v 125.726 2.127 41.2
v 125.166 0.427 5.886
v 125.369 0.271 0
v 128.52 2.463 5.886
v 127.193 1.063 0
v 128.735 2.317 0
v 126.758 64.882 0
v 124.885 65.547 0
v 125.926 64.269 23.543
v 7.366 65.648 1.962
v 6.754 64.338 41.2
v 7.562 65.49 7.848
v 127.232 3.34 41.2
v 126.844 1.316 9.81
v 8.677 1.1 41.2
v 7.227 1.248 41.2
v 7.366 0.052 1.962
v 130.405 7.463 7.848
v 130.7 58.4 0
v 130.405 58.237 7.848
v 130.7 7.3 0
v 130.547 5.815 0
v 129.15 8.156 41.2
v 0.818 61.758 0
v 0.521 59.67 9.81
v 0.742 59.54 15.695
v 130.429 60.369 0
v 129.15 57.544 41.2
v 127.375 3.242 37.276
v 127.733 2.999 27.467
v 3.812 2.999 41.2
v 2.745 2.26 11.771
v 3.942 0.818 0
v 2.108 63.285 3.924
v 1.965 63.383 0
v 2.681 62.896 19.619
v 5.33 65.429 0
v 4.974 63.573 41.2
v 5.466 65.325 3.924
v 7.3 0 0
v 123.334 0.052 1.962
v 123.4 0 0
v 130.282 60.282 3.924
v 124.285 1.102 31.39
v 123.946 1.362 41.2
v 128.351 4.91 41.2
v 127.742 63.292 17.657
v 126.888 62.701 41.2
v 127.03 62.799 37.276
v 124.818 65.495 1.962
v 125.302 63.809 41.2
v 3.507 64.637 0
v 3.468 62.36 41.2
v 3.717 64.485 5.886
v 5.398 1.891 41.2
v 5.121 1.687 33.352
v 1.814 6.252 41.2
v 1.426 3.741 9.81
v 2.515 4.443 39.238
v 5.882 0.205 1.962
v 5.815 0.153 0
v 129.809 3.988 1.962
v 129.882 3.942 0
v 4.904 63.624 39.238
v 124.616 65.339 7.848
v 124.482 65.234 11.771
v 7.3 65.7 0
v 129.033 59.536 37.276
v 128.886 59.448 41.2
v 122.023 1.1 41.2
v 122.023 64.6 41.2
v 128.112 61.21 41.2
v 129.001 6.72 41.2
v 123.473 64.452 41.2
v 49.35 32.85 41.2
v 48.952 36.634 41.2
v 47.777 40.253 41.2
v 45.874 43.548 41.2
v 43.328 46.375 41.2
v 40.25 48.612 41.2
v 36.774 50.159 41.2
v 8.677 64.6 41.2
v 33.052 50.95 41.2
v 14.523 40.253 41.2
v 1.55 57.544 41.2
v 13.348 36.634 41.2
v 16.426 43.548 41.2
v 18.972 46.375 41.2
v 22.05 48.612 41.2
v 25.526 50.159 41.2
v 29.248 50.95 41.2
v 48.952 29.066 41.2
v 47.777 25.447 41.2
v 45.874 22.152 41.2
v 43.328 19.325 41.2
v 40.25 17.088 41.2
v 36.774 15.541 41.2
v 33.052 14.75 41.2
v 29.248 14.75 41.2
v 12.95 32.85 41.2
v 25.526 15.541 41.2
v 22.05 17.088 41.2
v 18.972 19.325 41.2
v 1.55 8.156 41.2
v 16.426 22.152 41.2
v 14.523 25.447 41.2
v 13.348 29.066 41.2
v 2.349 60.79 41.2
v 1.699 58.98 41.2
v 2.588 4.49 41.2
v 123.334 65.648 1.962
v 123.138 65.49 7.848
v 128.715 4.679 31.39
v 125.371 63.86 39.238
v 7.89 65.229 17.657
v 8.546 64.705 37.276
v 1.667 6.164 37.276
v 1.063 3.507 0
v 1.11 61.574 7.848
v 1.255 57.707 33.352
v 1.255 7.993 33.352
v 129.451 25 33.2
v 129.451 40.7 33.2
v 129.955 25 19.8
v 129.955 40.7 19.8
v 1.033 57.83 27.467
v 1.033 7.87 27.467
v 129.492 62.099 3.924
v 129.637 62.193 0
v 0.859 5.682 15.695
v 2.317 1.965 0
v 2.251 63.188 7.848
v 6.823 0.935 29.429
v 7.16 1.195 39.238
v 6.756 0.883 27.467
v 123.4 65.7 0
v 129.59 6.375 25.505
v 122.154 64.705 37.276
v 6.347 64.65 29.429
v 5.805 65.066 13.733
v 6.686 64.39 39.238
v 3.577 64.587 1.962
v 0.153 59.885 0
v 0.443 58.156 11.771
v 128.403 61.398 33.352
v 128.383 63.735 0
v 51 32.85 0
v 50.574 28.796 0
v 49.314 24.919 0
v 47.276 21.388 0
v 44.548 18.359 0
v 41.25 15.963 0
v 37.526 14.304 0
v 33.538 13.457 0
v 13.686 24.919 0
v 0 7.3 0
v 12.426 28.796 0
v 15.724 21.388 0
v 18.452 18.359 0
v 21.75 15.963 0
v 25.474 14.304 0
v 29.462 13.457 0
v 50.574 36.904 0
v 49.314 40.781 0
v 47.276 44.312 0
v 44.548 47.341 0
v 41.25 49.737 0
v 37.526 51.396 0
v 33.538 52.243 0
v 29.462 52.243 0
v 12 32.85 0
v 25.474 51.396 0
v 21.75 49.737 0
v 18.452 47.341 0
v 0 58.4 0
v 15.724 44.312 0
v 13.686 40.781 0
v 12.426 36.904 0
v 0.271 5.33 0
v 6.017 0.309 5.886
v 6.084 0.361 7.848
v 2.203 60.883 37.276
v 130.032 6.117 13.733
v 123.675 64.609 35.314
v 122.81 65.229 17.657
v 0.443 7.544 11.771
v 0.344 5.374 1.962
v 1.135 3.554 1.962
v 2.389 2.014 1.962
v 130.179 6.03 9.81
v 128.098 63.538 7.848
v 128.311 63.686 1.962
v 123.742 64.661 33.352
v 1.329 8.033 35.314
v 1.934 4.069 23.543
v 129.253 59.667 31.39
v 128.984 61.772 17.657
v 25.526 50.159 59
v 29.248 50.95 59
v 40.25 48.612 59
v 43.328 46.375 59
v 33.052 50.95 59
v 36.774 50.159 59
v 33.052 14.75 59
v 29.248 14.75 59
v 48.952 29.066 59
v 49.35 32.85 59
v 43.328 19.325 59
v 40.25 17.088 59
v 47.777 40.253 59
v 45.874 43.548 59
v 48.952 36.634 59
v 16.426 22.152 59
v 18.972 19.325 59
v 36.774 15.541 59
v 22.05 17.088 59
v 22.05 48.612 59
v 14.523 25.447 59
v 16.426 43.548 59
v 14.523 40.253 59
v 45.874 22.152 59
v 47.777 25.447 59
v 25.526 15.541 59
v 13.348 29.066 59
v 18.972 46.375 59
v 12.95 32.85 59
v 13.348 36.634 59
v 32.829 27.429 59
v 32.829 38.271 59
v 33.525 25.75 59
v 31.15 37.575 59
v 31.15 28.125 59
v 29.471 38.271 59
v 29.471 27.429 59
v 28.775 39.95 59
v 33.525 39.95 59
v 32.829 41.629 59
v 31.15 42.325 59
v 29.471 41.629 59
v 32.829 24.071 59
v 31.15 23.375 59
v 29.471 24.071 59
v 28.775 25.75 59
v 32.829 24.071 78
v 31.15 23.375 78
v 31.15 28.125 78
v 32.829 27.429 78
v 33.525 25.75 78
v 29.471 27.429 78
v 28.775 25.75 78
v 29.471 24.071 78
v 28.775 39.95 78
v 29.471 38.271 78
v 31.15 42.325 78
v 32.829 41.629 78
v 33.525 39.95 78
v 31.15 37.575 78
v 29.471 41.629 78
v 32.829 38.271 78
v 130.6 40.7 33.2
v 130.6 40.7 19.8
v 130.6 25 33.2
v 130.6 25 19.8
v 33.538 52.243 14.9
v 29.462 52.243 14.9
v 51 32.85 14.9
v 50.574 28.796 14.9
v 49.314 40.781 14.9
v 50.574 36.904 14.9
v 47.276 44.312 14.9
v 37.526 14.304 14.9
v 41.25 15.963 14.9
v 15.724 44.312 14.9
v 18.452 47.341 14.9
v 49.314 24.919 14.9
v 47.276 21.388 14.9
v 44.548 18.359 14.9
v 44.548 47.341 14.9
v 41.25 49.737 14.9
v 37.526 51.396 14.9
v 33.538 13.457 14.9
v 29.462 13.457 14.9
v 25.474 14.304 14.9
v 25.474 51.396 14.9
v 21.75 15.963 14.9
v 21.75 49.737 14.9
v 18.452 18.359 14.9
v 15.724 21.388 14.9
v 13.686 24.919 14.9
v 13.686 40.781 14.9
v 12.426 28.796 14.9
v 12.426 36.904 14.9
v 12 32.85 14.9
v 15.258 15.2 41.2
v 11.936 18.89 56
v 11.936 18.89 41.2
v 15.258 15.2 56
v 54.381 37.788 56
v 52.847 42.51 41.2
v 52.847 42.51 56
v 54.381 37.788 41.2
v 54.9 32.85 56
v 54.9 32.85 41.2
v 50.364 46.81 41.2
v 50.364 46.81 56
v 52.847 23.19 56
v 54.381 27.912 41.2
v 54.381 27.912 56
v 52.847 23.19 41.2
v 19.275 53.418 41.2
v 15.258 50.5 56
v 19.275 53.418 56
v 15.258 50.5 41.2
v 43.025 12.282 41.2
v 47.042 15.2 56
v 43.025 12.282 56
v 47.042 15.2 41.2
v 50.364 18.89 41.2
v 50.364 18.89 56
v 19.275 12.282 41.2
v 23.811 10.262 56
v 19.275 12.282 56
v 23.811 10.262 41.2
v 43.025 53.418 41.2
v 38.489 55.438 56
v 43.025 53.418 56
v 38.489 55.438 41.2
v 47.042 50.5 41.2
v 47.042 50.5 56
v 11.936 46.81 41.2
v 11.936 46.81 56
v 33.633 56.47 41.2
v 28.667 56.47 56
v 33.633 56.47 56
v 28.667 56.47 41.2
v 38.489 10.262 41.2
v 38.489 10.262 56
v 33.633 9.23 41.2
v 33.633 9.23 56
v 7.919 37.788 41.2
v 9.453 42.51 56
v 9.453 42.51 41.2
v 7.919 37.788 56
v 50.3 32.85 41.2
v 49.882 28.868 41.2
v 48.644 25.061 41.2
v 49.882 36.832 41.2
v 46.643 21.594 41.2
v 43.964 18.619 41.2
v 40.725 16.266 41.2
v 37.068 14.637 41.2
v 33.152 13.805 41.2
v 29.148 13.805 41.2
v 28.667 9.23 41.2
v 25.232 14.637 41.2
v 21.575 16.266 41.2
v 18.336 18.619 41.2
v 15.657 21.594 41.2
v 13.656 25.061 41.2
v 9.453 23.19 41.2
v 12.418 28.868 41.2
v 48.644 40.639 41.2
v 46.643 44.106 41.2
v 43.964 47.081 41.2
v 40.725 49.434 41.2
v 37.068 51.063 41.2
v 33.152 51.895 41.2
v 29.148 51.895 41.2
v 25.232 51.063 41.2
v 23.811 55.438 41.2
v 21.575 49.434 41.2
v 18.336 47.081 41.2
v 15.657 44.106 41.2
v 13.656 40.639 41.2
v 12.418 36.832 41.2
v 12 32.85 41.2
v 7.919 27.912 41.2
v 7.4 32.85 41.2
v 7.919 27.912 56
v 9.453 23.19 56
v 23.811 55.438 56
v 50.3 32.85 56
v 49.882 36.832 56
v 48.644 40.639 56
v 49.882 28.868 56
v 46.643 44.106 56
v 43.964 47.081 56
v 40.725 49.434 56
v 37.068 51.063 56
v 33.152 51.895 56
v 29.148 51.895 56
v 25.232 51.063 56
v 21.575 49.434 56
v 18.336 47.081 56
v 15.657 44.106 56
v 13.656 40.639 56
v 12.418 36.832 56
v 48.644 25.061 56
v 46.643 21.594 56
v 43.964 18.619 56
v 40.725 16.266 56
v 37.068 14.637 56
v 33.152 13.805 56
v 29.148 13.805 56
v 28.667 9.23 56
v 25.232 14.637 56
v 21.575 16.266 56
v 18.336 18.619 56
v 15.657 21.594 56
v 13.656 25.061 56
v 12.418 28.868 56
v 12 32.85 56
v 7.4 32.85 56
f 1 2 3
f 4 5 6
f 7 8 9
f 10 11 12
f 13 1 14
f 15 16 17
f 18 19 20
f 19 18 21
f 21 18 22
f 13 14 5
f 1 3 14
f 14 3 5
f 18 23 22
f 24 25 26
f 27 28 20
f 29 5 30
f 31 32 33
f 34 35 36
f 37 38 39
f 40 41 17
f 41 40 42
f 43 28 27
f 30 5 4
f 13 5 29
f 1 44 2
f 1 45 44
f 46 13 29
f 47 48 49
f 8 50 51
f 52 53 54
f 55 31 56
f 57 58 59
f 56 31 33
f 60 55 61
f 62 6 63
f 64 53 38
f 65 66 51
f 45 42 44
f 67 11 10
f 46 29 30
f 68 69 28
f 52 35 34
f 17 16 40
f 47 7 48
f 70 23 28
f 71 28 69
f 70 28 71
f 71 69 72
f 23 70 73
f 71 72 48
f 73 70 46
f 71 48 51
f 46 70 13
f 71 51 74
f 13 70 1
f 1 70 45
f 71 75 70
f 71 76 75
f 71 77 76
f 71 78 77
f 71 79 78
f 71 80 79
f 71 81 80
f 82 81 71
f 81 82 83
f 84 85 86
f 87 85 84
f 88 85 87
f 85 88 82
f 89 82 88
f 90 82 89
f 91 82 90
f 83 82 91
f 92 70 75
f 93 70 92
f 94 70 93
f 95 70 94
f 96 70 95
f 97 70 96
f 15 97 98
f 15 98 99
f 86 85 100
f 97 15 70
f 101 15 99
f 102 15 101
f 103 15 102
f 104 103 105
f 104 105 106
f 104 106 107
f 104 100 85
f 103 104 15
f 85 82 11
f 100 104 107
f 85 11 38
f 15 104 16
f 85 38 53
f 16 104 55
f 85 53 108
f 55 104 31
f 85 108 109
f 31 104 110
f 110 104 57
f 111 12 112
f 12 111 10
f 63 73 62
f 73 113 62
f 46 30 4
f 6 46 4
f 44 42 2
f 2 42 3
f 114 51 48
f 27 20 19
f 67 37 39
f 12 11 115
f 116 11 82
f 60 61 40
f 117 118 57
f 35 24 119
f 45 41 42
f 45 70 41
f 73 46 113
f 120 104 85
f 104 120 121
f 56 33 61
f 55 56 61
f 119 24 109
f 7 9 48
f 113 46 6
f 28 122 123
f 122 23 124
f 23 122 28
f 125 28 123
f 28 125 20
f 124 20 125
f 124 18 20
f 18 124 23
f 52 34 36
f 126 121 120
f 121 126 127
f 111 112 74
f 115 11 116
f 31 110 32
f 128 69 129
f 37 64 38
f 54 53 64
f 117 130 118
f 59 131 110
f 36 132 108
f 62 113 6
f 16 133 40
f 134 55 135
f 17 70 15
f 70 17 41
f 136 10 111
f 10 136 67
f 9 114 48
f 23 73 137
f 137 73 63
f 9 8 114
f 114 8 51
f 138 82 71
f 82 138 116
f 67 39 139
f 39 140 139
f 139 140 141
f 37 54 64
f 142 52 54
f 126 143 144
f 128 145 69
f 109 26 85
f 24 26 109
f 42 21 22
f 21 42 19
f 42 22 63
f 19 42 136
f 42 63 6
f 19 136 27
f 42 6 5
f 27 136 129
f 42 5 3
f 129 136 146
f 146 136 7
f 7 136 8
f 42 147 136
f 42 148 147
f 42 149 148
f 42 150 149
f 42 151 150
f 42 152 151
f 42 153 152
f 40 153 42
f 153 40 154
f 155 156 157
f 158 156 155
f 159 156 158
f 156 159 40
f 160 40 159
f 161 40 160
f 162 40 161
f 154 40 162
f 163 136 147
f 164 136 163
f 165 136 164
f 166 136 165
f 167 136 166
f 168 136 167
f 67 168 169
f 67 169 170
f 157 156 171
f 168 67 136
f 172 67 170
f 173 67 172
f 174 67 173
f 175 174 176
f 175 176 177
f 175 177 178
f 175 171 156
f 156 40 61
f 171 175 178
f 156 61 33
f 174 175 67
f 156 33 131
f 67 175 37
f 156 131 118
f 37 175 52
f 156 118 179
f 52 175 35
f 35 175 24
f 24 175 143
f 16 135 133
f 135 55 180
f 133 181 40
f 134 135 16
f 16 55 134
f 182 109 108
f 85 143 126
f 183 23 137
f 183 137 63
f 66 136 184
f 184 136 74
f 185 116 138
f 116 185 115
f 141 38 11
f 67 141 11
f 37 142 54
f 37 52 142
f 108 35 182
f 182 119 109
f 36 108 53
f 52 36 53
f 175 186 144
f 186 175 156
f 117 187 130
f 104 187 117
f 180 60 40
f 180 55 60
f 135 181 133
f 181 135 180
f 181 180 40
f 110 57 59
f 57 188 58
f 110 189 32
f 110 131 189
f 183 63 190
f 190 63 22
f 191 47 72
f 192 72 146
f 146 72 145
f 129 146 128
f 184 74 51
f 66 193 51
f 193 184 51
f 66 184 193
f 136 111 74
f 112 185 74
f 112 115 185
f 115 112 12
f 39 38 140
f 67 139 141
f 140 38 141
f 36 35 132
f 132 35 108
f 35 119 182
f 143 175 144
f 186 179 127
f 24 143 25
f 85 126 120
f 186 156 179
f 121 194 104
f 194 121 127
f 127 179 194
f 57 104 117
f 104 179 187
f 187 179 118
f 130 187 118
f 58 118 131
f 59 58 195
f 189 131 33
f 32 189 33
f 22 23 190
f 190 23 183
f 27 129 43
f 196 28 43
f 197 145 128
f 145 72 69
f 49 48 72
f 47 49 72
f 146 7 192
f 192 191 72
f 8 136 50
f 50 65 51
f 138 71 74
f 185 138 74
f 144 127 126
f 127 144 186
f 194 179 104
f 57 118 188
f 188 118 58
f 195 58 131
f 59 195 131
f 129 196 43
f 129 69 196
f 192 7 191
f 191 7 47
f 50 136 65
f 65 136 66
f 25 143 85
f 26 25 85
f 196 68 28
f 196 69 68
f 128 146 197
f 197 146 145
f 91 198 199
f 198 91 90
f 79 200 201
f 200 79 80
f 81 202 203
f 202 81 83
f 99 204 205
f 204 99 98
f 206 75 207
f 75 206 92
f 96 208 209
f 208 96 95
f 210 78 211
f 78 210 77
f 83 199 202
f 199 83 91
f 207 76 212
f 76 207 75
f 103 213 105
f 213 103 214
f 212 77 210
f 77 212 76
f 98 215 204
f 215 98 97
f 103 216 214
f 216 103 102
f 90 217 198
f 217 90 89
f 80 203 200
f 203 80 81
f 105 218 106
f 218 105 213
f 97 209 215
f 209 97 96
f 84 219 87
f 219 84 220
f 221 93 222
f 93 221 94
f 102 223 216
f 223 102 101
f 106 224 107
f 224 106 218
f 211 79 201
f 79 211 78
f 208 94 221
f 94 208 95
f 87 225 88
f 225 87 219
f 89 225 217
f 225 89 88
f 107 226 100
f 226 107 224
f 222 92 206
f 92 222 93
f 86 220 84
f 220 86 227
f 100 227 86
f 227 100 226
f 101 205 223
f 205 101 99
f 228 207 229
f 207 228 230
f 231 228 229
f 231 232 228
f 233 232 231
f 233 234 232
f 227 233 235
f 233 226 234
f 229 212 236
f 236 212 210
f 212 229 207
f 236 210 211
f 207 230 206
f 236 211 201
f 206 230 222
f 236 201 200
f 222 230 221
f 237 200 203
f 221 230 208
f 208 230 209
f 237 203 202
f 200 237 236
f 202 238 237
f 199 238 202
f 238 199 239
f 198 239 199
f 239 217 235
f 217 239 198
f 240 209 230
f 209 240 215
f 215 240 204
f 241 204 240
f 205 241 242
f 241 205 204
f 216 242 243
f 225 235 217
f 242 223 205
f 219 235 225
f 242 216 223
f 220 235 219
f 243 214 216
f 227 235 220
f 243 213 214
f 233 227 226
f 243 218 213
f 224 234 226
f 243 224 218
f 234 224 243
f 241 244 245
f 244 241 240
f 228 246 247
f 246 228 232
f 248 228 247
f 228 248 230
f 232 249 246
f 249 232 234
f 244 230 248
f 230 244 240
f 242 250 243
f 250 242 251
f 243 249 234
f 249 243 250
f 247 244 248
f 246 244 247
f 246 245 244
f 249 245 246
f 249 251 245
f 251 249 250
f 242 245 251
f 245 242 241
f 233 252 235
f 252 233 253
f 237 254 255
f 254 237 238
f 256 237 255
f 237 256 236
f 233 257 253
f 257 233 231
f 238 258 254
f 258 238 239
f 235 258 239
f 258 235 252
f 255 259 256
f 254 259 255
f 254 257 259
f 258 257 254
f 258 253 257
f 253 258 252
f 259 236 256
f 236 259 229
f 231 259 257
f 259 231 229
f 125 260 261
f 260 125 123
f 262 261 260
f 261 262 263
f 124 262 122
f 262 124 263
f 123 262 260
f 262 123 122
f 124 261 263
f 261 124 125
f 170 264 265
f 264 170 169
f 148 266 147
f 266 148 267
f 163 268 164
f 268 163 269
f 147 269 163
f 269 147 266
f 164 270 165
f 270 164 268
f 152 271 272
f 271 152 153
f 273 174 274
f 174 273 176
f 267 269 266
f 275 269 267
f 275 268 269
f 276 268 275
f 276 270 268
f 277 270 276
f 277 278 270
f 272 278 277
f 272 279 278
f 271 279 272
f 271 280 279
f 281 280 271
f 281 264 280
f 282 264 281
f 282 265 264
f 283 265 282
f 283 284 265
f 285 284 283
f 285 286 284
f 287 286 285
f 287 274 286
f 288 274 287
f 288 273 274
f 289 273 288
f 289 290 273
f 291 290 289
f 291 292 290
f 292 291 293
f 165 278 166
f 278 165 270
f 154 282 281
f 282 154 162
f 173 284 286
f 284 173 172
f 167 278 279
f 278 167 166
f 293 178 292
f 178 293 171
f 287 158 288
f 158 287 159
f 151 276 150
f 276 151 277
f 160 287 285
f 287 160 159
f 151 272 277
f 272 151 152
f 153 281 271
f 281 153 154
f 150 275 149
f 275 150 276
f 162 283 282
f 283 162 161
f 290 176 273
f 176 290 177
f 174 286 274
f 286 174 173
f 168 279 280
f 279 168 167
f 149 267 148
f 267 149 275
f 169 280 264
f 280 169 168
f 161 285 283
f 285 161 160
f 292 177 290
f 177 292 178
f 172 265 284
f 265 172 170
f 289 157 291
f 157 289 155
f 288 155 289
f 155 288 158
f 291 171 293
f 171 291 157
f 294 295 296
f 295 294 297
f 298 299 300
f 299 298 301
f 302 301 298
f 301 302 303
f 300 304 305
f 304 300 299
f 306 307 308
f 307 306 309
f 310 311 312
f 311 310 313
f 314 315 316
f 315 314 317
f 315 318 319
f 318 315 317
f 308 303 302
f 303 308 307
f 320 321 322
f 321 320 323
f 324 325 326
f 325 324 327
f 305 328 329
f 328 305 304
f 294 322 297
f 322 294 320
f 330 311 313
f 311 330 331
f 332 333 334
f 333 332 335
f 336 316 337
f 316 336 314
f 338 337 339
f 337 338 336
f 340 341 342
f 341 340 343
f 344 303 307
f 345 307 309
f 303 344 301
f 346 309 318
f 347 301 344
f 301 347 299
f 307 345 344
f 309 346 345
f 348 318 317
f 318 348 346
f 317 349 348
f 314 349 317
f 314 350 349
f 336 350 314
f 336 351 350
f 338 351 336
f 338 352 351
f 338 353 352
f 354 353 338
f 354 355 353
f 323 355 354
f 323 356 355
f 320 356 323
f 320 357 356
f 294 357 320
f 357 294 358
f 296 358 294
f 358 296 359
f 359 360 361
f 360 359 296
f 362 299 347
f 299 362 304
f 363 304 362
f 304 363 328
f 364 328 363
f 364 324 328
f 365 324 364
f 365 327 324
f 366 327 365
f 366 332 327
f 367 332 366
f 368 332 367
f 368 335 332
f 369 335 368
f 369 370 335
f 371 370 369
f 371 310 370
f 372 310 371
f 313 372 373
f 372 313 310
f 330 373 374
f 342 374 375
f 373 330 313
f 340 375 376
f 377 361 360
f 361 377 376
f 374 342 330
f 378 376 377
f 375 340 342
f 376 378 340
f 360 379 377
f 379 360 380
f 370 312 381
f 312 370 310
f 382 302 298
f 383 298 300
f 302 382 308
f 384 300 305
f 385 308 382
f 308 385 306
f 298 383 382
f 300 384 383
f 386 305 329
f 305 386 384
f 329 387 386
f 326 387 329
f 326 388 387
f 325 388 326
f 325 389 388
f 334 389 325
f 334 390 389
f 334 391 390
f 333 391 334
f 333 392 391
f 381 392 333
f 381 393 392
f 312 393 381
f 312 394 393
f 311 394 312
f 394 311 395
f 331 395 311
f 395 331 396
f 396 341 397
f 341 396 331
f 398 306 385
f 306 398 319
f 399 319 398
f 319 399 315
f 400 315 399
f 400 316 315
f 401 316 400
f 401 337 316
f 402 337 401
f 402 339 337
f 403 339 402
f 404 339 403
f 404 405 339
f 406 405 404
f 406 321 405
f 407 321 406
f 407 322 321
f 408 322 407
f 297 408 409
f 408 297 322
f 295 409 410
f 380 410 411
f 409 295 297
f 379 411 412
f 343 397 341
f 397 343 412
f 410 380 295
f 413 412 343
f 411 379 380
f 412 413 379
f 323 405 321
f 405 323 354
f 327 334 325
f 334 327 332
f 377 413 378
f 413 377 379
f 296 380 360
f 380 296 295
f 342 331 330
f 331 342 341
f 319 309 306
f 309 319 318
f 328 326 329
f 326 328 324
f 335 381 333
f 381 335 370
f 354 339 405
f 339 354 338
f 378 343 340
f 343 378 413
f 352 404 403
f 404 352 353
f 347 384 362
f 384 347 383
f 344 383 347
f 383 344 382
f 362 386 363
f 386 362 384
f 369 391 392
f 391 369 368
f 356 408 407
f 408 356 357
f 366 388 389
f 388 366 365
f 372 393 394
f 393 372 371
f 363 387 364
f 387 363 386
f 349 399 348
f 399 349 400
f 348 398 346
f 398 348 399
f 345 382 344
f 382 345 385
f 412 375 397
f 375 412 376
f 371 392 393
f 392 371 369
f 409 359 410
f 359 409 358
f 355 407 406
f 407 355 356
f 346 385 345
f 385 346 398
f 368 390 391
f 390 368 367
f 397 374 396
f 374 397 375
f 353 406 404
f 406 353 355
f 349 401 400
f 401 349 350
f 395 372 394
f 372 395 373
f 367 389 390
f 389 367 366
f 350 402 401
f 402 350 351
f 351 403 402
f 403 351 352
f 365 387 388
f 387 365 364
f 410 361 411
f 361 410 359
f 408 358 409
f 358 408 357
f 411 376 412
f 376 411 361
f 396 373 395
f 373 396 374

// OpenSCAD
// file: devolo.inc.scad
devolo_face_length_mm = 130.7;
devolo_face_width_mm = 65.7;
devolo_face_rounding_mm = 7.3;
devolo_depth_mm = 41.2;
devolo_inner_length_mm = 127.6;
devolo_inner_width_mm = 63.5;
plug_male_diam_mm = 36.4;
plug_male_length_mm = 17.8;
plug_male_dist_mm = 11.4 + (devolo_face_length_mm-devolo_inner_length_mm)/2;
plug_male_conn_diam_mm = 4.75;
plug_male_conn_length_mm = 19.0;
plug_male_conn_spacing_mm = 14.2;
rj45_width_mm = 15.7;
rj45_height_mm = 13.4;
rj45_depth_mm = 3;
rj45_dist_mm = 8.0;
plug_female_diam_mm = 39.0;
plug_female_depth_mm = 14.9;
plug_female_dist_mm = 12.0;
socket_outer_diam_mm = 47.5;
socket_inner_diam_mm = 38.3;
socket_inner_depth_mm = 14.8;
// main file
include <devolo.inc.scad>

function average(a, b) = (a+b)/2;

module devolo() {
    difference() {
        union() {
            // body
            scale_along_x = devolo_inner_length_mm/devolo_face_length_mm;
            scale_along_y = devolo_inner_width_mm/devolo_face_width_mm;
            translate([devolo_face_length_mm/2, devolo_face_width_mm/2])
            linear_extrude(devolo_depth_mm, scale=[scale_along_x, scale_along_y])
            offset(r=devolo_face_rounding_mm) offset(delta=-devolo_face_rounding_mm) square([devolo_face_length_mm, devolo_face_width_mm], center=true);

            // plug male
            translate([plug_male_dist_mm+plug_male_diam_mm/2, devolo_face_width_mm/2, devolo_depth_mm]) cylinder(d=plug_male_diam_mm, h=plug_male_length_mm);
            translate([plug_male_dist_mm+plug_male_diam_mm/2, devolo_face_width_mm/2-plug_male_conn_spacing_mm/2, devolo_depth_mm+plug_male_length_mm]) cylinder(d=plug_male_conn_diam_mm, h=plug_male_conn_length_mm);
            translate([plug_male_dist_mm+plug_male_diam_mm/2, devolo_face_width_mm/2+plug_male_conn_spacing_mm/2, devolo_depth_mm+plug_male_length_mm]) cylinder(d=plug_male_conn_diam_mm, h=plug_male_conn_length_mm);

            // RJ45
            color("black") translate([devolo_inner_length_mm, devolo_face_width_mm/2, devolo_depth_mm-rj45_dist_mm-rj45_height_mm/2]) rotate([90, 0, 90]) cube([rj45_width_mm, rj45_height_mm, 2*rj45_depth_mm], center=true);
        }
    // plug female
    translate([plug_female_dist_mm+plug_female_diam_mm/2, devolo_face_width_mm/2, 0-1]) cylinder(d=plug_female_diam_mm, h=plug_female_depth_mm+1);
    }
}

module socket() {
    translate([plug_male_dist_mm+plug_male_diam_mm/2, devolo_face_width_mm/2, devolo_depth_mm+socket_inner_depth_mm/2])
    difference() {
        cylinder(d=socket_outer_diam_mm, h=socket_inner_depth_mm, center=true);
        cylinder(d=socket_inner_diam_mm, h=socket_inner_depth_mm+1, center=true);
    }
}

devolo();
socket();
